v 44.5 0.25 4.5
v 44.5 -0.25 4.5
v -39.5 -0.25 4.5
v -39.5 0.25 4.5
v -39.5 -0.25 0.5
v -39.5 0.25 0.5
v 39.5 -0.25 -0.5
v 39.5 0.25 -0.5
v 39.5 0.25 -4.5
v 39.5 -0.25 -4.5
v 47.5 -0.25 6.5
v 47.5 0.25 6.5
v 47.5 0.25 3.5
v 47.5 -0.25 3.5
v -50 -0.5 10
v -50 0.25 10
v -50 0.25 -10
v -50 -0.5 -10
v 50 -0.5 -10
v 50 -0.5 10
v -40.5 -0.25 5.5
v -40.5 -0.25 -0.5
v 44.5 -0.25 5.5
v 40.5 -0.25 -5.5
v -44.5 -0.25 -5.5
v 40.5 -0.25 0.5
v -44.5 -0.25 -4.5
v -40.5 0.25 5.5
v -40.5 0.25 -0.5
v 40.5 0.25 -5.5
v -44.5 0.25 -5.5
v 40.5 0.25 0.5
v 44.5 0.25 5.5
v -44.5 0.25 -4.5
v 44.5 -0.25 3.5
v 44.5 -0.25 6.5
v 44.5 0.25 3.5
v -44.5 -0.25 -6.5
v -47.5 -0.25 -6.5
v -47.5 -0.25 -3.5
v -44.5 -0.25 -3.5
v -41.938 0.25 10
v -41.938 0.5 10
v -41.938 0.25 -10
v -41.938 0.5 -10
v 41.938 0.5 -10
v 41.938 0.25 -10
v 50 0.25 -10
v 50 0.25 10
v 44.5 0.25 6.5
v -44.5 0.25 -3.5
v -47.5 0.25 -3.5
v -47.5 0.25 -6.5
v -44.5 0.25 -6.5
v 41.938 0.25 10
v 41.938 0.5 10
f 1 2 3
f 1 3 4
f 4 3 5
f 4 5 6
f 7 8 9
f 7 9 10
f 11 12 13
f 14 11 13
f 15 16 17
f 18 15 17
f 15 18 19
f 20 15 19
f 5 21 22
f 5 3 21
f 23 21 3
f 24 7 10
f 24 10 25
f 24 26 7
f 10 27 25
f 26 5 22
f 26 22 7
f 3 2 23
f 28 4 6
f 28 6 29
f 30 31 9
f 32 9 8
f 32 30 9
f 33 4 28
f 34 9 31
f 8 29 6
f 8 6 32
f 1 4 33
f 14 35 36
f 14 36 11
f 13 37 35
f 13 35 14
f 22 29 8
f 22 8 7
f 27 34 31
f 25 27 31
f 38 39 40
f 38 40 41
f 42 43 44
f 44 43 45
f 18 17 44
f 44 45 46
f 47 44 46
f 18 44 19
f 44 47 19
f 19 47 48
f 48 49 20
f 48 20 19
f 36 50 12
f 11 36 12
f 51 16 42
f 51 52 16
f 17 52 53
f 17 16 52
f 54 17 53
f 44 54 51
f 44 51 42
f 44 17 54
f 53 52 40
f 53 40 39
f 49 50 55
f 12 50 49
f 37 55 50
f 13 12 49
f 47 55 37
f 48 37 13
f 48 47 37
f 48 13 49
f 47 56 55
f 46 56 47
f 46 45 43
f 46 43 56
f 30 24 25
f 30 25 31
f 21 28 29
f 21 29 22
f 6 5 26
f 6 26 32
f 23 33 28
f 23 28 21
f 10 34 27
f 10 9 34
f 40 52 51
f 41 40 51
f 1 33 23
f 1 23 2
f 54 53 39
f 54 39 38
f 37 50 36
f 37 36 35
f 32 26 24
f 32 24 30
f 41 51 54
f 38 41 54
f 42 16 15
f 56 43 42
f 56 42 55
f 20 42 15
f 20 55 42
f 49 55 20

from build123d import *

# Parameters (mm, degrees)
SKETCH1_W           = 100
SKETCH1_H           = 20
BOSS_EXTRUDE1_DEPTH = 0.5
SKETCH2_W           = 1
SKETCH2_H           = 0.5
SKETCH4_W           = 3
SKETCH4_H           = 3
CUT_EXTRUDE1_DEPTH  = 0.75
SKETCH5_W           = 5.5
SKETCH5_H           = 20
CUT_EXTRUDE2_DEPTH  = 0.25
SKETCH6_W           = 2.562318192
SKETCH6_H           = 20
CUT_EXTRUDE3_DEPTH  = 0.25


with BuildPart() as part:
    # Sketch1 → Boss-Extrude1 (new, symmetric)
    with BuildSketch(Plane(origin=(0, 0, 0), x_dir=(1, 0, 0), z_dir=(0, 1, 0))):
        Rectangle(SKETCH1_W, SKETCH1_H)
    extrude(amount=BOSS_EXTRUDE1_DEPTH, both=True)


with BuildPart() as body_2:
    # Sweep2: sweep along a curve in space
    with BuildLine() as sweep2_path:
        Line((40, 0, 5), (46, 0, 5))
        Line((-40, 0, 5), (40, 0, 5))
        Line((-40, 0, 0), (-40, 0, 5))
        Line((40, 0, 0), (-40, 0, 0))
        Line((40, 0, -5), (40, 0, 0))
        Line((-40, 0, -5), (40, 0, -5))
        Line((-40, 0, -5), (-46, 0, -5))
    # Sketch2 → Sweep2 (sweep)
    with BuildSketch(Plane(origin=(40, 0, 0), x_dir=(0, 0, -1), z_dir=(1, 0, 0))):
        with Locations((-5, 0)):
            Rectangle(SKETCH2_W, SKETCH2_H)
    sweep(path=sweep2_path.line, transition=Transition.RIGHT)


with BuildPart() as cut_extrude1_tool:
    # Sketch4 → Cut-Extrude1 (new body)
    with BuildSketch(Plane(origin=(0, 0.5, 0), x_dir=(1, 0, 0), z_dir=(0, 1, 0))):
        with Locations((-46, 5)):
            Rectangle(SKETCH4_W, SKETCH4_H)
        with Locations((46, -5)):
            Rectangle(SKETCH4_W, SKETCH4_H)
    extrude(amount=-CUT_EXTRUDE1_DEPTH)


with BuildPart() as part_1:
    add(part.part)

    # Cut-Extrude1: cut by cut_extrude1_tool
    add(cut_extrude1_tool.part, mode=Mode.SUBTRACT)

    # Sketch5 → Cut-Extrude2 (cut)
    with BuildSketch(Plane(origin=(0, 0.5, 0), x_dir=(1, 0, 0), z_dir=(0, 1, 0))):
        with Locations((47.25, 0)):
            Rectangle(SKETCH5_W, SKETCH5_H)
        with Locations((-47.25, 0)):
            Rectangle(SKETCH5_W, SKETCH5_H)
    extrude(amount=-CUT_EXTRUDE2_DEPTH, mode=Mode.SUBTRACT)

    # Sketch6 → Cut-Extrude3 (cut)
    with BuildSketch(Plane(origin=(0, 0.5, 0), x_dir=(1, 0, 0), z_dir=(0, 1, 0))):
        with Locations((-43.218840904, 0)):
            Rectangle(SKETCH6_W, SKETCH6_H)
        with Locations((43.218840904, 0)):
            Rectangle(SKETCH6_W, SKETCH6_H)
    extrude(amount=-CUT_EXTRUDE3_DEPTH, mode=Mode.SUBTRACT)


with BuildPart() as body_2_1:
    add(body_2.part)

    # Cut-Extrude1: cut by cut_extrude1_tool
    add(cut_extrude1_tool.part, mode=Mode.SUBTRACT)


solid = Compound([part_1.part, body_2_1.part])
